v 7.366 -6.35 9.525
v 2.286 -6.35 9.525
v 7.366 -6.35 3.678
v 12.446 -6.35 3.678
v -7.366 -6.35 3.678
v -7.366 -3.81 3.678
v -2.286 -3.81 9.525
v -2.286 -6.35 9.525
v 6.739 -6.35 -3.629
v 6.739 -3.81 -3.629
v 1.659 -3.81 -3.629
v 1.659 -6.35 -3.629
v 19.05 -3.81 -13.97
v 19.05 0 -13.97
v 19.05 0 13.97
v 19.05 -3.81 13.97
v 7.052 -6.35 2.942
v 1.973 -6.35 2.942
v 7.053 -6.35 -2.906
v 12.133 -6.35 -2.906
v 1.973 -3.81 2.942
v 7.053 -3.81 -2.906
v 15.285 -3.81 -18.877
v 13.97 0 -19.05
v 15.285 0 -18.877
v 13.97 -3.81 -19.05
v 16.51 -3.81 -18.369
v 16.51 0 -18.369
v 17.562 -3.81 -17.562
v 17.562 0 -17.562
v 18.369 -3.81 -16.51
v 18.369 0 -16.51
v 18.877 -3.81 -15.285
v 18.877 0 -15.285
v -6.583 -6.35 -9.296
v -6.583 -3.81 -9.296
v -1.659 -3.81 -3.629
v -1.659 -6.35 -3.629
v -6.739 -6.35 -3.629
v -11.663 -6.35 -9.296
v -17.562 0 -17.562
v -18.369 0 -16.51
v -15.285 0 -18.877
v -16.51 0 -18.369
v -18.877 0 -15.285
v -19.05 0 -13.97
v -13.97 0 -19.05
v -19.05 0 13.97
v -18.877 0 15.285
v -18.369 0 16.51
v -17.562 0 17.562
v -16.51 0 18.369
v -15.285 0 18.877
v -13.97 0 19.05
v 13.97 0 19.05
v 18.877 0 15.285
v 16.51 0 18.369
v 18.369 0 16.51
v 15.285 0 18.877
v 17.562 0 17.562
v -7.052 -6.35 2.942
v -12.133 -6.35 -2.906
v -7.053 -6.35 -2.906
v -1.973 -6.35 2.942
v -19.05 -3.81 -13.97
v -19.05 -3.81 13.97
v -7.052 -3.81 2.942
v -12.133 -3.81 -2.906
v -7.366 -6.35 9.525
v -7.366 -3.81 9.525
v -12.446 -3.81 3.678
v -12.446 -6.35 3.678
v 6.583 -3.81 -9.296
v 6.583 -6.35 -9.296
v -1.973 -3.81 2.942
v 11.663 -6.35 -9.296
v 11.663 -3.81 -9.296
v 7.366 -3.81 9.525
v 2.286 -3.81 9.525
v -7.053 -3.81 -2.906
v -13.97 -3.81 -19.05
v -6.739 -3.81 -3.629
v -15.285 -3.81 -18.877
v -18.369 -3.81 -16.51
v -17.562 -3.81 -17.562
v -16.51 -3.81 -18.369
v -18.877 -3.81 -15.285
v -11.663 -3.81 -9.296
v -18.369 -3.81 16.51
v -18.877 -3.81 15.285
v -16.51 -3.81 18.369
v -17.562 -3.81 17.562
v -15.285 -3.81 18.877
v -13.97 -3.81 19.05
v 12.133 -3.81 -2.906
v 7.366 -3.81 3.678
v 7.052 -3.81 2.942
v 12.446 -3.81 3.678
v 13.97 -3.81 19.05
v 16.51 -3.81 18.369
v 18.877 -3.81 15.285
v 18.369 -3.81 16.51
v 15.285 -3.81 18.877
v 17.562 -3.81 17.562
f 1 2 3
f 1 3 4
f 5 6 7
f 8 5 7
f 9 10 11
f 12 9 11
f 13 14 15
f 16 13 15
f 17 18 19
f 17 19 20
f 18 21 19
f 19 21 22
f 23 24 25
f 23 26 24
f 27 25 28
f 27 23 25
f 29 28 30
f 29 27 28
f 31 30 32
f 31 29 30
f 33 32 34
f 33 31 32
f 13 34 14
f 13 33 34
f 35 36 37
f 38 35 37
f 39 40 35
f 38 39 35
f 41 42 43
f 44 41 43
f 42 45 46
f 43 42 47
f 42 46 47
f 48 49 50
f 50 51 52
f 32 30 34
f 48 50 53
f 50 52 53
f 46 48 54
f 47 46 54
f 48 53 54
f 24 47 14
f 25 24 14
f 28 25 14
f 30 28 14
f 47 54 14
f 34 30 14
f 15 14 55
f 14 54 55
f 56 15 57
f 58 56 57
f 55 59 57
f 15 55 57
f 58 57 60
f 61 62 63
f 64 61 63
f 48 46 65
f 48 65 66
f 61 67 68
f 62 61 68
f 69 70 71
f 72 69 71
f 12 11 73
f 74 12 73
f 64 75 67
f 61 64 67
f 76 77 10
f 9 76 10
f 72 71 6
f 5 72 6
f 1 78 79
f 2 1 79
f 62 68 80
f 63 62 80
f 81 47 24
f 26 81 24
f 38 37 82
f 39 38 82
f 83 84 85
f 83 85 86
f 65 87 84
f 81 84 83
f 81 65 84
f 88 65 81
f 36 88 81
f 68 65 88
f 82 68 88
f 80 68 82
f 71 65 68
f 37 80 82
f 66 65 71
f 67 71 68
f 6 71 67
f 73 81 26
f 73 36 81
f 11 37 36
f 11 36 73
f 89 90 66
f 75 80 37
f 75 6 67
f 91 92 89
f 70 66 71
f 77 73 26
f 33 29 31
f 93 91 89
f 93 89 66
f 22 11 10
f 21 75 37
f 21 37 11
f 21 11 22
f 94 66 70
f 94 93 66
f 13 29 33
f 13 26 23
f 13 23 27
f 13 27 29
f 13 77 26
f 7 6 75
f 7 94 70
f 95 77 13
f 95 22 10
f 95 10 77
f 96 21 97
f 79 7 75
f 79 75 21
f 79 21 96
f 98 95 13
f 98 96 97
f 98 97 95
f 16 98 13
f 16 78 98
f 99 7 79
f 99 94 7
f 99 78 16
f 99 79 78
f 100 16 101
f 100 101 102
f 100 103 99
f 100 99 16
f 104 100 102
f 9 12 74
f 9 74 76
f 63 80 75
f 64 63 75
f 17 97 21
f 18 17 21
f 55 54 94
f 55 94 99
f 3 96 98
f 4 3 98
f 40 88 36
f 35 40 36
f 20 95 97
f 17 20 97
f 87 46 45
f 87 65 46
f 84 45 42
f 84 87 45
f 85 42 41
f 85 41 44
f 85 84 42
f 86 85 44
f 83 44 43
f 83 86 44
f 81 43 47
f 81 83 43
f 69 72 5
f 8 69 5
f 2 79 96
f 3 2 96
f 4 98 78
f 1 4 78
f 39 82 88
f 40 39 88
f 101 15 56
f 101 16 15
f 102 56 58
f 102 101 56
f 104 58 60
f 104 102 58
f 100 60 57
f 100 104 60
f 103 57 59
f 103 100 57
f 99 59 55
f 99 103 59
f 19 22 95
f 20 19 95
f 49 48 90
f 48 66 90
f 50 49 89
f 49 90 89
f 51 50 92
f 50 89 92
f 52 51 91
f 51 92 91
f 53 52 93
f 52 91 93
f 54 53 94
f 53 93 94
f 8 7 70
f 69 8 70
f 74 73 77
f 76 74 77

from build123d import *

# Parameters (mm, degrees)
F0_W     = 38.1
F0_H     = 38.1
F1_DEPTH = 3.81
F2_R     = 5.08
F4_DEPTH = 2.54


with BuildPart() as f1:
    # F0 (on Front) → F1 (new body)
    with BuildSketch(Plane.XZ):
        Rectangle(F0_W, F0_H)
    extrude(amount=F1_DEPTH)

    # F2
    f2_edges = [f1.edges().sort_by_distance(p)[0] for p in [
        (19.05, -1.905, 19.05),
        (-19.05, -1.905, 19.05),
        (-19.05, -1.905, -19.05),
        (19.05, -1.905, -19.05),
    ]]
    fillet(f2_edges, radius=F2_R)

    # F3 (on face) → F4 (join)
    with BuildSketch(Plane.XZ.offset(3.81)):
        Polygon((-7.366, 3.678485), (-2.286, 9.525), (-7.366, 9.525), (-12.446, 3.678485), align=None)
        Polygon((-1.973369, 2.942095), (-7.052271, 2.942095), (-12.133434, -2.905793), (-7.053434, -2.905793), align=None)
        Polygon((-1.659051, -3.629045), (-6.739051, -3.629045), (-11.663045, -9.296048), (-6.583045, -9.296048), align=None)
        Polygon((11.663045, -9.296048), (6.739051, -3.629045), (1.659051, -3.629045), (6.583045, -9.296048), align=None)
        Polygon((12.133434, -2.905793), (7.052271, 2.942095), (1.973369, 2.942095), (7.053434, -2.905793), align=None)
        Polygon((2.286, 9.525), (7.366, 3.678485), (12.446, 3.678485), (7.366, 9.525), align=None)
    extrude(amount=F4_DEPTH)


solid = f1.part
